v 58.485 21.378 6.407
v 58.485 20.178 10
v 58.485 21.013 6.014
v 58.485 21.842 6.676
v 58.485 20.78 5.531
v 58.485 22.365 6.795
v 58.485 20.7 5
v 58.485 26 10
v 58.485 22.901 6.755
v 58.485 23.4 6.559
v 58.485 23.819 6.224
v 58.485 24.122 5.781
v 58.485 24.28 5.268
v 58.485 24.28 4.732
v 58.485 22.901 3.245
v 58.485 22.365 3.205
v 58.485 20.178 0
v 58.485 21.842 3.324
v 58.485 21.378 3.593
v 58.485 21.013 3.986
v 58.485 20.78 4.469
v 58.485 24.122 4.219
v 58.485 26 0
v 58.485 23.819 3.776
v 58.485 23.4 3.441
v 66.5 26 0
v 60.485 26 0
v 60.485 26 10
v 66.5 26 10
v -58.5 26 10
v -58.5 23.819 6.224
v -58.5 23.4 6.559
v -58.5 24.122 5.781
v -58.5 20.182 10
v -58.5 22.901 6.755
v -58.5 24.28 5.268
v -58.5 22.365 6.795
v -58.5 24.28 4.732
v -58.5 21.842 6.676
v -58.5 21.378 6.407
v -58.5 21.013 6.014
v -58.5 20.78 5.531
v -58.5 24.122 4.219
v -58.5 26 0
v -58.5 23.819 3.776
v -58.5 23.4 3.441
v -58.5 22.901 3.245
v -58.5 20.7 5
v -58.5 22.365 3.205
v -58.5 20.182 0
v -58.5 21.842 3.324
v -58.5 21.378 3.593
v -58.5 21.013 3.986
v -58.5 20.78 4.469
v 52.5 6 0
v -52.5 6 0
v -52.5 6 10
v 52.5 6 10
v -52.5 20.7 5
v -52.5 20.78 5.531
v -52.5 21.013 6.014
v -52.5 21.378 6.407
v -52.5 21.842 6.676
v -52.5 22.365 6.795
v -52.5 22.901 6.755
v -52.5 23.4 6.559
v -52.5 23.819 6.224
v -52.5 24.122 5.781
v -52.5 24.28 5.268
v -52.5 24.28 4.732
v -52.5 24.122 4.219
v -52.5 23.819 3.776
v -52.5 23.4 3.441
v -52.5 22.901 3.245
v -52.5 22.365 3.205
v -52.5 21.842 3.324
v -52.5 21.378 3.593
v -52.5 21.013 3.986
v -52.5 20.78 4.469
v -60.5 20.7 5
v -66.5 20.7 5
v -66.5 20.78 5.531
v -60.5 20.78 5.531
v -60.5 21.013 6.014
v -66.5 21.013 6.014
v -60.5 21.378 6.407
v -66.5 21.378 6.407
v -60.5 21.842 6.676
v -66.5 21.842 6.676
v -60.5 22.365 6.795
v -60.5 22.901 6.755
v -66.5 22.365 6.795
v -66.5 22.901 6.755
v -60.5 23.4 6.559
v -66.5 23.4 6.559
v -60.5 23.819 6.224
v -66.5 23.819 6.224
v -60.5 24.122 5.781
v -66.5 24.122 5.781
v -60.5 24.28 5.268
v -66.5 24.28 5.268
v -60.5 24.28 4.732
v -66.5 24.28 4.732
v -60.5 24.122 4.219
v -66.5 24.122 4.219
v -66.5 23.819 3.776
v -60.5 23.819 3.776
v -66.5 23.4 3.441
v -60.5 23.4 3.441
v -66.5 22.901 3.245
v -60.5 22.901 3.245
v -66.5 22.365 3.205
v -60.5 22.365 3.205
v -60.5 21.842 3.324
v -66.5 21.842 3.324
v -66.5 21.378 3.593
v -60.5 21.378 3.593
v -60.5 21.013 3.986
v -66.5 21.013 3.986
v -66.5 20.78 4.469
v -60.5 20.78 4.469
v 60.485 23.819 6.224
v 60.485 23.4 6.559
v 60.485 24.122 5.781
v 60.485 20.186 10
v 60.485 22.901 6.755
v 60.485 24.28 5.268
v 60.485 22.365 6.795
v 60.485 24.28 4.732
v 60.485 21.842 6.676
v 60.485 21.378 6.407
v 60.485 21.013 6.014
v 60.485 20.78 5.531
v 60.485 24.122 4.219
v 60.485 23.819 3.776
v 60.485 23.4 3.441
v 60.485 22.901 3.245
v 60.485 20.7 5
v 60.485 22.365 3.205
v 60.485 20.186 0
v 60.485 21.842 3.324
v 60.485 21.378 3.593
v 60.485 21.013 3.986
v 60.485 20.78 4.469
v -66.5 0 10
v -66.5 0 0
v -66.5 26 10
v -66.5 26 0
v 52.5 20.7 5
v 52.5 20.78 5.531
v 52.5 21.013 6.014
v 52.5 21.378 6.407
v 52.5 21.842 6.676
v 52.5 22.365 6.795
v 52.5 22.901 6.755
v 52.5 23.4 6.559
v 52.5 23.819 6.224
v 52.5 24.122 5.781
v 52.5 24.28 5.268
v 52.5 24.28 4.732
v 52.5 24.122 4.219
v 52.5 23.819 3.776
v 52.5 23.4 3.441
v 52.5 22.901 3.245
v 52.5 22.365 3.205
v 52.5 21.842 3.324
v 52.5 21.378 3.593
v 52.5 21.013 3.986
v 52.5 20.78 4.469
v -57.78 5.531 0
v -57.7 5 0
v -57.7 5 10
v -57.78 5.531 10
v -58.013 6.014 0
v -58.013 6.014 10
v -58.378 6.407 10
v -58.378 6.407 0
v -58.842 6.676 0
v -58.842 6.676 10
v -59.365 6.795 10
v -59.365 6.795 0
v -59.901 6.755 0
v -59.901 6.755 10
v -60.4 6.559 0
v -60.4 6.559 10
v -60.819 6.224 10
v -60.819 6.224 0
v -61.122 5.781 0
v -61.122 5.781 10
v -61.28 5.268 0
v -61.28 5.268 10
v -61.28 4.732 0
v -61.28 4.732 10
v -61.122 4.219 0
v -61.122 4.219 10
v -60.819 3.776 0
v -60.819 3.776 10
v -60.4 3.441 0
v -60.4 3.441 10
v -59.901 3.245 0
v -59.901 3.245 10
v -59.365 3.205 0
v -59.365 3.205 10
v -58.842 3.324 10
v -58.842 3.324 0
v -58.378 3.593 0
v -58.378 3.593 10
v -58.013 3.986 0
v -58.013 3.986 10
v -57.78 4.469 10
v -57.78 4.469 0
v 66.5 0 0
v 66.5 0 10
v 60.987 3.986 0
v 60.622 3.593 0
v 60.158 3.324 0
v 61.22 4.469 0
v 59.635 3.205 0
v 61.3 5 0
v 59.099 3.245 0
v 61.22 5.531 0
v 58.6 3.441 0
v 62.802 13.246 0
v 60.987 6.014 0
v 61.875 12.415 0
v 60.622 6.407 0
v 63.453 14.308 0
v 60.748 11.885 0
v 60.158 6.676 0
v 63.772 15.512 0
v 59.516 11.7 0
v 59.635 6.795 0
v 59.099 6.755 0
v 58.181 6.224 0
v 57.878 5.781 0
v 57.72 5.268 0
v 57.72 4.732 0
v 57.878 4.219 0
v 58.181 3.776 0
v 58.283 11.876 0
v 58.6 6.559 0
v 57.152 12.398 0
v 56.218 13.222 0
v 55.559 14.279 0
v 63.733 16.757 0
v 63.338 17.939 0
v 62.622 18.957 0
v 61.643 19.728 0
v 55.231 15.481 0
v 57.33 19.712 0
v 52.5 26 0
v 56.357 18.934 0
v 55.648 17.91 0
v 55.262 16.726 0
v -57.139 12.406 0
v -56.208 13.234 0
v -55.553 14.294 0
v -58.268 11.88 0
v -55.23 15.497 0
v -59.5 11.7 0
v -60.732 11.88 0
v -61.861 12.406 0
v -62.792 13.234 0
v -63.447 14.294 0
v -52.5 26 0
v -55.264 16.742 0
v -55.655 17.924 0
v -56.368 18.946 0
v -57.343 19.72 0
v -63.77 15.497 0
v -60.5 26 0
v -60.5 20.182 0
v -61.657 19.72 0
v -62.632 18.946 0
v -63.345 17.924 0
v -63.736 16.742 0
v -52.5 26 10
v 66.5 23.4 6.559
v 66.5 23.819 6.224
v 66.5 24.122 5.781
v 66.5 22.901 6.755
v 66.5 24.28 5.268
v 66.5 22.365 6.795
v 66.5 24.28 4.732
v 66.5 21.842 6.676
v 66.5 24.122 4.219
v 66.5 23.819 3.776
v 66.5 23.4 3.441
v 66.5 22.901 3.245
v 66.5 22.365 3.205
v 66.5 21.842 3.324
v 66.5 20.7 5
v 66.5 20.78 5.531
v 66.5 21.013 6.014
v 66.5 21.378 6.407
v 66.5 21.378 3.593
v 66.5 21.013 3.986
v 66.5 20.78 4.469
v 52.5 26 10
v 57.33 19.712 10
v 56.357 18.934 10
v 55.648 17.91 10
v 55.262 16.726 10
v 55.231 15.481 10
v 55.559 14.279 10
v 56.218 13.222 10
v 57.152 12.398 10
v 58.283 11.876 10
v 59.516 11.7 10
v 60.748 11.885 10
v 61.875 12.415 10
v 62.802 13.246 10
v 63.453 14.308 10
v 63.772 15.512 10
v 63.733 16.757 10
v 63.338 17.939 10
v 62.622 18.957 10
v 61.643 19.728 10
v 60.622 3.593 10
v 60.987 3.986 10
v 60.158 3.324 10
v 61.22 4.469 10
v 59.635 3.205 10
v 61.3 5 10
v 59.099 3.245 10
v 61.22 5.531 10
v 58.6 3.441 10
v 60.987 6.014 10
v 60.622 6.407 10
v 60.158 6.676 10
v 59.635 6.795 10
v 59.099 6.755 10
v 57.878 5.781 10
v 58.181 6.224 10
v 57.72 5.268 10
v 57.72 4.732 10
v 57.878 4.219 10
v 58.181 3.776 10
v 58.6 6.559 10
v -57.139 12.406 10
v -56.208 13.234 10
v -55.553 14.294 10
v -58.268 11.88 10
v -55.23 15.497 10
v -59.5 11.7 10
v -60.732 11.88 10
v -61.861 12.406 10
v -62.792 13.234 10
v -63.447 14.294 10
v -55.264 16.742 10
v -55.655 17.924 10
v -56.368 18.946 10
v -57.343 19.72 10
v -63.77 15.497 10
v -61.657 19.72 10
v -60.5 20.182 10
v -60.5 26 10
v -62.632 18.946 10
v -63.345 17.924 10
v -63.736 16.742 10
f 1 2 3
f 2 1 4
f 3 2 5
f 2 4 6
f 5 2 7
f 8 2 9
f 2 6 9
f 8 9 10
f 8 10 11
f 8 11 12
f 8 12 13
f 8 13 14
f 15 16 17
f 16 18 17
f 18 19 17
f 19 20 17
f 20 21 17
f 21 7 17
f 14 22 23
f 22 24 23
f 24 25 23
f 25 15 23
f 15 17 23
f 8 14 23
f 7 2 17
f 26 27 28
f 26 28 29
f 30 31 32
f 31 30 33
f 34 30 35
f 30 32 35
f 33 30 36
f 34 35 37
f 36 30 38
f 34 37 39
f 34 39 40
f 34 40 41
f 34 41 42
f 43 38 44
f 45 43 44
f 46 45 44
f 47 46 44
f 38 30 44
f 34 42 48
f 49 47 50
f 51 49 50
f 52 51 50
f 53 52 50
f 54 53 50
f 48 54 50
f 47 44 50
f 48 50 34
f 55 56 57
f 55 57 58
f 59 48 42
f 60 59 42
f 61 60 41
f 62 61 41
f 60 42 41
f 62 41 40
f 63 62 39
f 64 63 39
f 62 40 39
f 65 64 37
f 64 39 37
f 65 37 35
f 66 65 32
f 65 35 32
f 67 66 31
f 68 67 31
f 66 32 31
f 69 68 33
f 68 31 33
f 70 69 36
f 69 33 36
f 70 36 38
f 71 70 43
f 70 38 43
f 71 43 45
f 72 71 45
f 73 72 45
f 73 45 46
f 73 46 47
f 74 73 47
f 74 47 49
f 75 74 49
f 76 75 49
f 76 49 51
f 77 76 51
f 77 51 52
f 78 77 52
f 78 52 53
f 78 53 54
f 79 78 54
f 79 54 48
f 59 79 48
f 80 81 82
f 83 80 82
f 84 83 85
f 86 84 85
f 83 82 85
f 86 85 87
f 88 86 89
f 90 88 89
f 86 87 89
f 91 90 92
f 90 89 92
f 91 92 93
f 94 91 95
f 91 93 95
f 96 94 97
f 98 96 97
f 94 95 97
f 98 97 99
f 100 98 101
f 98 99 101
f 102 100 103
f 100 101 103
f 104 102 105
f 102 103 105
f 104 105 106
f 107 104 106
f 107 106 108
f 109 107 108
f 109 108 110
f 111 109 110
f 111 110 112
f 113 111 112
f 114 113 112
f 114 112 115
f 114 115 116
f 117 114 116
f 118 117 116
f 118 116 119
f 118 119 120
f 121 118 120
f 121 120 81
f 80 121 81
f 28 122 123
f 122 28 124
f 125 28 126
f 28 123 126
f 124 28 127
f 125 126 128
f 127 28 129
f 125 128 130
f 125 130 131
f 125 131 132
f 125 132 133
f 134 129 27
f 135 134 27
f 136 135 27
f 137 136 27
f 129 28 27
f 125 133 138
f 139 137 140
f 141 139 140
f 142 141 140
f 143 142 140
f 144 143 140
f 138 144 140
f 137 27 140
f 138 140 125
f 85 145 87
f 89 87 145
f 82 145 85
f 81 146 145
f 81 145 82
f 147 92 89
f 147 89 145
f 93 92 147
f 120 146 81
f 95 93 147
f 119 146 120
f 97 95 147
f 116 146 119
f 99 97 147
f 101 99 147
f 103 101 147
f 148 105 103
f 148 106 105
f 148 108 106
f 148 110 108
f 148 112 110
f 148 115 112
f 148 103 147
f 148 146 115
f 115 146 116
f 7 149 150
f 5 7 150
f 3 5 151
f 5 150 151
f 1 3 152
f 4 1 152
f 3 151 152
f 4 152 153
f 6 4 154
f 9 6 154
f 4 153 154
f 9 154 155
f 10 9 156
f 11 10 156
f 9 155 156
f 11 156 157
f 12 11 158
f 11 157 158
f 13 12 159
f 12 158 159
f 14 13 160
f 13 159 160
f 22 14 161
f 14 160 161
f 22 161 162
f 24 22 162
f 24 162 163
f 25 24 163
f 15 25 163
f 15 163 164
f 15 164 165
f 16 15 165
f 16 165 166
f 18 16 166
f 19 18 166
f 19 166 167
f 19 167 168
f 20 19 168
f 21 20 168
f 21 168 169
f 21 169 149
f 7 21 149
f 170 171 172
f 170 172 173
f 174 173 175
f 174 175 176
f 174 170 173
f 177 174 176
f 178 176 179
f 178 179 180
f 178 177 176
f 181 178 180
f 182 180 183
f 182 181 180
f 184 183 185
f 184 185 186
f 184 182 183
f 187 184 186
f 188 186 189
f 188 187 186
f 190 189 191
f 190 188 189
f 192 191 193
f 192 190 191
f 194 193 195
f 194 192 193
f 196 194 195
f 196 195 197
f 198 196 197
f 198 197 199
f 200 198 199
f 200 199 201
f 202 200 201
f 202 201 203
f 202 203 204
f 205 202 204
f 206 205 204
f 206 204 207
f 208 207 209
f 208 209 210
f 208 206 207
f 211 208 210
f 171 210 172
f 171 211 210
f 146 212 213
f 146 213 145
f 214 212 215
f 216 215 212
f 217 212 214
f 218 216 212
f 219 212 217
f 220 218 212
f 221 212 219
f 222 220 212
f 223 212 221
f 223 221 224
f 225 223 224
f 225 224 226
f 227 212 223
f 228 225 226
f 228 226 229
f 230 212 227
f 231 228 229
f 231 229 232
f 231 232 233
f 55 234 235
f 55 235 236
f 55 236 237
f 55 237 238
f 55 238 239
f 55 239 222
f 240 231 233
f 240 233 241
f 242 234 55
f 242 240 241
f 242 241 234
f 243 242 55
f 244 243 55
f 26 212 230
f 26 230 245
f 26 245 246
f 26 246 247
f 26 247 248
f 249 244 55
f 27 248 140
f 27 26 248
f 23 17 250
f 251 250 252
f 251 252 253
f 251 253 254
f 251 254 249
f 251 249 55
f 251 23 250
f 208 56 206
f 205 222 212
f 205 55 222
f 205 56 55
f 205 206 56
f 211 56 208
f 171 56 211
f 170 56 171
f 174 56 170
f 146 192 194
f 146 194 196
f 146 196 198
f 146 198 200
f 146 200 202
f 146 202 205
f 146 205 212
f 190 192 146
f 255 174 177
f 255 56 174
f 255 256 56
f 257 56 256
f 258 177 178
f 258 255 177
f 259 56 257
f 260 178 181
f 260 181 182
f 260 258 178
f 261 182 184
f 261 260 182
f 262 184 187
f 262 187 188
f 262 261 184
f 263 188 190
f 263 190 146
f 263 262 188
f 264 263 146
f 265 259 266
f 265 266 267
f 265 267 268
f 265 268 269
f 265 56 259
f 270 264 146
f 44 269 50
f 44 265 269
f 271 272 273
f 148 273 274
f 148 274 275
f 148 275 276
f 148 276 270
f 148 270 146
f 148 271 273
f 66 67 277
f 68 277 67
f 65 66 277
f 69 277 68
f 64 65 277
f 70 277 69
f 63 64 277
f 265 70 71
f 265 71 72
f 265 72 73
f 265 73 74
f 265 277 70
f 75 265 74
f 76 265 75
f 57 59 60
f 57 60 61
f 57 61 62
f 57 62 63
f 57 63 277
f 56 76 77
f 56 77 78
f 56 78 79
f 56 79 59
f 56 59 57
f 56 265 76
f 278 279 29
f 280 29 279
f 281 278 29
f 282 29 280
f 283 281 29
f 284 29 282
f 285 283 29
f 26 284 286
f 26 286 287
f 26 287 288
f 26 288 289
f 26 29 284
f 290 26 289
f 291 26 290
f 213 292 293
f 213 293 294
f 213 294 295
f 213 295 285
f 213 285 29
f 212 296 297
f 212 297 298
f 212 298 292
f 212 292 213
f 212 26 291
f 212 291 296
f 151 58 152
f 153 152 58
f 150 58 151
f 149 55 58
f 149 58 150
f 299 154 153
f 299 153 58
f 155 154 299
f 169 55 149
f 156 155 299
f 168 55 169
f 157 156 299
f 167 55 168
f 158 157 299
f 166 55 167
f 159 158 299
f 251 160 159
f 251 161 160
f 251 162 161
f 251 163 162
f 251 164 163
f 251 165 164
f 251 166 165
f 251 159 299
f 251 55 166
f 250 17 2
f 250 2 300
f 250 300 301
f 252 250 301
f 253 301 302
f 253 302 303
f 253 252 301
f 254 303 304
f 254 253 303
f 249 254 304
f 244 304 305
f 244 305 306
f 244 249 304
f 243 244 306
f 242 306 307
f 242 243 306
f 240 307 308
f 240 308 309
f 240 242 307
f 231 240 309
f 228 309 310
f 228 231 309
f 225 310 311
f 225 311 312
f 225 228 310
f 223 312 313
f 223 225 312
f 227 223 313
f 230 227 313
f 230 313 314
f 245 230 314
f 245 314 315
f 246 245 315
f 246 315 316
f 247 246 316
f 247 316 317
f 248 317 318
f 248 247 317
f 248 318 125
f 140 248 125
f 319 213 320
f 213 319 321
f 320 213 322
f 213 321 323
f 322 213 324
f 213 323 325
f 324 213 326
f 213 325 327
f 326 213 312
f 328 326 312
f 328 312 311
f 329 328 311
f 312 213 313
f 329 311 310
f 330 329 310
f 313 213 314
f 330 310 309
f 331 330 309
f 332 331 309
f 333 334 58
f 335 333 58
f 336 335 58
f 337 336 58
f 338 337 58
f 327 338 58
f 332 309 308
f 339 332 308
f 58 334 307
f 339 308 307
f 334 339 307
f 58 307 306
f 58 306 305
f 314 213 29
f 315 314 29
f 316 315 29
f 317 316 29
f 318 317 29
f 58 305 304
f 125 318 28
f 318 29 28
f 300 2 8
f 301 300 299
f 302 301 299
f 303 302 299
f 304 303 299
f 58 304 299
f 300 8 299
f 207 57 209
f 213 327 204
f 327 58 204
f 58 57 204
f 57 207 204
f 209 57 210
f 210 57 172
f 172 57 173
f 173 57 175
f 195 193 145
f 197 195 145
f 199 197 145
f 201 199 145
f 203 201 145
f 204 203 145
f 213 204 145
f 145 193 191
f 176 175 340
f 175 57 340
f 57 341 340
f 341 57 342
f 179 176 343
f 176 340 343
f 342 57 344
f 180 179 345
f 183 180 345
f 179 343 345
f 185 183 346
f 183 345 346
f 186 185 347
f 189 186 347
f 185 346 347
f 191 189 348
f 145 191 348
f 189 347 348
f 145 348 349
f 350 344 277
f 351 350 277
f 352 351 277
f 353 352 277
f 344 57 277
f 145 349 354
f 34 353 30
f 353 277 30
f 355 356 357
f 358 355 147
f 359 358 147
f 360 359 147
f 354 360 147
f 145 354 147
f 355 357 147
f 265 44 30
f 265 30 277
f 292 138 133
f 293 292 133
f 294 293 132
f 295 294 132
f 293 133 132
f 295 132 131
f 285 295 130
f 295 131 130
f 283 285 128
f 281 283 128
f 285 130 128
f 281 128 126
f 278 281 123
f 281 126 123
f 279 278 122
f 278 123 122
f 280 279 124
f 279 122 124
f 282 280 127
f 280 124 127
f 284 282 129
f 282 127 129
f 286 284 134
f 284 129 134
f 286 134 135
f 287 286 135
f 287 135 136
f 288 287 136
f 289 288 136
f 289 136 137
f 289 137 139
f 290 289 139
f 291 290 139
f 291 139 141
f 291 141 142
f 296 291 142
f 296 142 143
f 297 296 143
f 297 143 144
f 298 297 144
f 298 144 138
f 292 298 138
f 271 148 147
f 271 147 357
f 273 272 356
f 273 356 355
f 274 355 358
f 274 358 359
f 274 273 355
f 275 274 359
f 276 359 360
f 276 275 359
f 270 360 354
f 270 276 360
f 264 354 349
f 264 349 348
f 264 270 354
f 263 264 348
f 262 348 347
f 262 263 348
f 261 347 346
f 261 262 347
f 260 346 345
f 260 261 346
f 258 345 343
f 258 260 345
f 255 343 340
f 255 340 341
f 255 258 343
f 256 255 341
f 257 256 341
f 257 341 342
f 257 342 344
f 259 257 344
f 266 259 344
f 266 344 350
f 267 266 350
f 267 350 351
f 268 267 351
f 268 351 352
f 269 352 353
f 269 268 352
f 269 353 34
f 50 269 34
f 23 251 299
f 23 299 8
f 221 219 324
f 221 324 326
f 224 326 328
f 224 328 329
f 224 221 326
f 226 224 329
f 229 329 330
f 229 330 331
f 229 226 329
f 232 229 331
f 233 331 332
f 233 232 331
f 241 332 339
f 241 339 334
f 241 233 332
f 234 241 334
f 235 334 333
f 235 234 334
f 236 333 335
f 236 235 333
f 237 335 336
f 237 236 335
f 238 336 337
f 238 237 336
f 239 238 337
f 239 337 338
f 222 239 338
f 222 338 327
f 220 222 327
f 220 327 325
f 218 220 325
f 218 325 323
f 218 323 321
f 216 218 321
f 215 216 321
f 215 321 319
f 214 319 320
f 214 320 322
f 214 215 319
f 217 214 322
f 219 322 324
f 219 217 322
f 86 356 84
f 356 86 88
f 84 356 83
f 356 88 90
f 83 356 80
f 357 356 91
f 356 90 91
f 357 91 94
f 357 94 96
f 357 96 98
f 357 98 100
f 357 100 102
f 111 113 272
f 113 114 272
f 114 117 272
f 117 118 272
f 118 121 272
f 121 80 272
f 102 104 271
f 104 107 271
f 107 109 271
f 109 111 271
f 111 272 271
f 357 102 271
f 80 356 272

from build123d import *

# Parameters (mm, degrees)
SKETCH_R     = 1.8
PAD_DEPTH    = 10
SKETCH001_R  = 1.8
POCKET_DEPTH = 133.001


with BuildPart() as part:
    # Sketch → Pad (new body)
    with BuildSketch(Plane.XY):
        with BuildLine():
            ThreePointArc((-60.5, 20.182105), (-59.5, 11.7), (-58.5, 20.182105))
            Line((-58.5, 26), (-58.5, 20.182105))
            Line((-58.5, 26), (-52.5, 26))
            Line((-52.5, 26), (-52.5, 6))
            Line((-52.5, 6), (52.5, 6))
            Line((52.5, 6), (52.5, 26))
            Line((52.5, 26), (58.484608, 26))
            Line((58.484608, 20.178394), (58.484608, 26))
            ThreePointArc((58.484608, 20.178394), (59.515826, 11.700029), (60.484608, 20.185755))
            Line((60.484608, 26), (60.484608, 20.185755))
            Line((60.484608, 26), (66.5, 26))
            Line((66.5, 26), (66.5, 0))
            Line((66.5, 0), (-66.5, 0))
            Line((-66.5, 0), (-66.5, 26))
            Line((-66.5, 26), (-60.5, 26))
            Line((-60.5, 20.182105), (-60.5, 26))
        make_face()
        with Locations((-59.5, 5)):
            Circle(SKETCH_R, mode=Mode.SUBTRACT)
        with Locations((59.5, 5)):
            Circle(SKETCH_R, mode=Mode.SUBTRACT)
    extrude(amount=PAD_DEPTH)

    # Sketch001 → Pocket (cut, through all)
    with BuildSketch(Plane(origin=(-66.5, 0, 0), x_dir=(0, -1, 0), z_dir=(-1, 0, 0))):
        with Locations((-22.5, 5)):
            Circle(SKETCH001_R)
    extrude(amount=-POCKET_DEPTH, mode=Mode.SUBTRACT)


solid = part.part
